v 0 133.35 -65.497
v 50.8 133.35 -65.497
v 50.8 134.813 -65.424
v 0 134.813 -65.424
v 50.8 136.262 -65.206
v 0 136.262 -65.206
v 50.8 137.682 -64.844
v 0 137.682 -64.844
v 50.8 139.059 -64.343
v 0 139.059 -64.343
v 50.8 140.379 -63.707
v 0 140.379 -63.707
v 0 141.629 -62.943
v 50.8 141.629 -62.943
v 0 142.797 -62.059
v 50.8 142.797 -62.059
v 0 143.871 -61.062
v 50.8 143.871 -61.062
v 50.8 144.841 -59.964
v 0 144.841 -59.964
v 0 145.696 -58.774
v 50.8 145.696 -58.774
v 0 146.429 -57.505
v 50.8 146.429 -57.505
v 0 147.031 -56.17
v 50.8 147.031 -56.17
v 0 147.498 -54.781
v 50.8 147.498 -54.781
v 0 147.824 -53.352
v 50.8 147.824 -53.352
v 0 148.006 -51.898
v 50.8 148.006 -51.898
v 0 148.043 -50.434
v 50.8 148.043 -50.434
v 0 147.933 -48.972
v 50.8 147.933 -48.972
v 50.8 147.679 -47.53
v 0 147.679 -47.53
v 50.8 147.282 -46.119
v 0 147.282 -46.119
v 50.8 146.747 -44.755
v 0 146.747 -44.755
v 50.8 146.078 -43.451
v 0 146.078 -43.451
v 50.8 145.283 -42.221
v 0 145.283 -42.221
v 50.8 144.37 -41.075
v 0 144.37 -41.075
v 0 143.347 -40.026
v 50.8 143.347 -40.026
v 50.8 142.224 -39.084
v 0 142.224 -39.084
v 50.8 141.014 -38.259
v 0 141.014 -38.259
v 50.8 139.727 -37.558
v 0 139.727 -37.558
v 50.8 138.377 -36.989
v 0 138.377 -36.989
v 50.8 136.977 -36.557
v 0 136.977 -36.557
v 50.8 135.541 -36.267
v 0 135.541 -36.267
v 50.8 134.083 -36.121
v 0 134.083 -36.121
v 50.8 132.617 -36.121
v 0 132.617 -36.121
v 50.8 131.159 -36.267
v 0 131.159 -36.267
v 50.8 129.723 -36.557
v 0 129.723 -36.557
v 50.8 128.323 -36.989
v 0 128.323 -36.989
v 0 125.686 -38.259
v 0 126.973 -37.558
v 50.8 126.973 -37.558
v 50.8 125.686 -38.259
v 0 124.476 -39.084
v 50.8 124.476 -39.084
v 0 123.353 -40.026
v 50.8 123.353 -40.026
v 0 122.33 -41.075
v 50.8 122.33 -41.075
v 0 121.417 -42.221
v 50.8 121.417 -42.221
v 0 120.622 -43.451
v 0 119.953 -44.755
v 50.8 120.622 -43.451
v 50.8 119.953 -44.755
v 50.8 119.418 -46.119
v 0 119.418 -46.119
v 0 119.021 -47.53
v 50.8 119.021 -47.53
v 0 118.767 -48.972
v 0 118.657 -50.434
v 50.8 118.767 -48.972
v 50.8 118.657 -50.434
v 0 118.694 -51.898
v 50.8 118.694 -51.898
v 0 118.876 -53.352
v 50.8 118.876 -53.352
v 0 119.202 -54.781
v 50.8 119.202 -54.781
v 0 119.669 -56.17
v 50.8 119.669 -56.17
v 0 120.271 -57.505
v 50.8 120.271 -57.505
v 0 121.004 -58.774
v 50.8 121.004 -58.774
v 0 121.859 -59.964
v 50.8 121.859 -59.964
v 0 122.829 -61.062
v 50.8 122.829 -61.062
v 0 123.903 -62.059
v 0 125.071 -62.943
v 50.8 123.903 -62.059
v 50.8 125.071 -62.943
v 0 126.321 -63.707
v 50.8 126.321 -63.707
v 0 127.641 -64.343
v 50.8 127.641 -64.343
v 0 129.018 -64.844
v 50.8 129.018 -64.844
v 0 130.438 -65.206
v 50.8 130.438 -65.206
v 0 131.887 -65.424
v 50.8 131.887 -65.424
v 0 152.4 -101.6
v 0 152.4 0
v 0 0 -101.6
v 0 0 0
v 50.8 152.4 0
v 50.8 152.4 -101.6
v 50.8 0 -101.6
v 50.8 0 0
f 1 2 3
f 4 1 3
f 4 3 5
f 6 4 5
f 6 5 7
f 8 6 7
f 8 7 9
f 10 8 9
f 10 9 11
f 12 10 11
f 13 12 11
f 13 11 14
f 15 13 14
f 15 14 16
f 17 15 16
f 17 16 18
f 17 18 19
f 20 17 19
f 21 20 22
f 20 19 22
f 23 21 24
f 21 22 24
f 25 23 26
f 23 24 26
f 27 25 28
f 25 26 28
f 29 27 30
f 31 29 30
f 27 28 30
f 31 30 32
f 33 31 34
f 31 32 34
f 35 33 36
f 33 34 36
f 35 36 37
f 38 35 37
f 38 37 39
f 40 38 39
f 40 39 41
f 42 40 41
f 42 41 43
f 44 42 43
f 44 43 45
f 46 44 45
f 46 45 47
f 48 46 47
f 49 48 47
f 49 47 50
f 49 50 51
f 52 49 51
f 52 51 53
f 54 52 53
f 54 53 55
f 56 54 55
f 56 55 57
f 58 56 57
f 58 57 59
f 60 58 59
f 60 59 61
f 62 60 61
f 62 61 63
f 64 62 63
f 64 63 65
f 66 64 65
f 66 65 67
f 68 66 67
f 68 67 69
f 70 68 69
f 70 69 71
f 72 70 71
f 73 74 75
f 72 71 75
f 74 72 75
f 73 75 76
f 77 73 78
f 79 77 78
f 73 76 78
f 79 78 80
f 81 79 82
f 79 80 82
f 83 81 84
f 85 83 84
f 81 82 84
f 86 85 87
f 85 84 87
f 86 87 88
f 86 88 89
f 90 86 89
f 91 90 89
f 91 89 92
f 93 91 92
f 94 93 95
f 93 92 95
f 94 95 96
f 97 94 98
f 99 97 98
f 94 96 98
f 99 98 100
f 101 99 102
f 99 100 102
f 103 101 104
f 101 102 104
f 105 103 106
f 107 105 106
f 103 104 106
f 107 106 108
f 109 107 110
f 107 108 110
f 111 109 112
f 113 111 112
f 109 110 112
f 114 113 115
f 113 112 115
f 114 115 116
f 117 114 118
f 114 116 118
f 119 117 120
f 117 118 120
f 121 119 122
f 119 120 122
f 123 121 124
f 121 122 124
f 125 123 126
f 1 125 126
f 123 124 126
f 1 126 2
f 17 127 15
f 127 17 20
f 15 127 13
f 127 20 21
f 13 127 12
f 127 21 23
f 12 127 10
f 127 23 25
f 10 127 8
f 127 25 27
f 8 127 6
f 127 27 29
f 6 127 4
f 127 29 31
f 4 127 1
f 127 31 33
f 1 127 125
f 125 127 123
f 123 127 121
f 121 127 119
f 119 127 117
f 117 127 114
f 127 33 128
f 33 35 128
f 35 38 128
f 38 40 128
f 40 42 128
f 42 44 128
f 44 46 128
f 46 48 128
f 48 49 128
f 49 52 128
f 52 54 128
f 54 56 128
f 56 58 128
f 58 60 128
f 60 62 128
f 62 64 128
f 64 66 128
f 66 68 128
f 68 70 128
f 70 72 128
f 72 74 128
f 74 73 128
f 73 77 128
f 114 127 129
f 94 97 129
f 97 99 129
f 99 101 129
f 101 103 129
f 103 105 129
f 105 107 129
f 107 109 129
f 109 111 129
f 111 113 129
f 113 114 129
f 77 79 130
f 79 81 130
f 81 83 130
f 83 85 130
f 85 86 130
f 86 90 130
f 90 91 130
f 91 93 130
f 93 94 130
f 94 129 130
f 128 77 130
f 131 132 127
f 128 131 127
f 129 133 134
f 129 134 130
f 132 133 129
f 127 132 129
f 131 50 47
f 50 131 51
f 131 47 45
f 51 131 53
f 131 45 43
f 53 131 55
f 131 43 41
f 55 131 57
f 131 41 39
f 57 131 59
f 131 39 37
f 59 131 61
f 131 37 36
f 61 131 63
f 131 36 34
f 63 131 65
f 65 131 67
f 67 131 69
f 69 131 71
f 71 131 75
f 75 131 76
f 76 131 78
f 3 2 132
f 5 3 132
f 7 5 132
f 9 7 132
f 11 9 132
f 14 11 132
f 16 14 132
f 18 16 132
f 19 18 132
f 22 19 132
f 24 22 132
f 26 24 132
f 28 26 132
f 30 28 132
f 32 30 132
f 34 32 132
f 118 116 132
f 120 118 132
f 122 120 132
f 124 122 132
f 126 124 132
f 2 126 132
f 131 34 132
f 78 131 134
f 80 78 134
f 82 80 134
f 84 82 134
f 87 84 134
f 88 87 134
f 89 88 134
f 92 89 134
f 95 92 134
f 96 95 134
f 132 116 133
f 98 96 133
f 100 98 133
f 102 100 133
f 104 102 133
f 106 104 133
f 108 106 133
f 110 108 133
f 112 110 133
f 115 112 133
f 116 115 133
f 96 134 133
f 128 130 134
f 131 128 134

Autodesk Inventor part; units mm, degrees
ref_plane "YZ Plane" through (0, 0, 0) normal (1, 0, 0) x (0, 1, 0)
ref_plane "XZ Plane" through (0, 0, 0) normal (0, 1, 0) x (-1, 0, 0)
ref_plane "XY Plane" through (0, 0, 0) normal (0, 0, 1) x (1, 0, 0)
sketch "Sketch1" plane through (0, 0, 0) normal (0, 1, 0) x (-1, 0, 0)
  line L0 (0, 0) -> (-50.8, 0)
  line L1 (-50.8, 0) -> (-50.8, -101.6)
  line L2 (-50.8, -101.6) -> (0, -101.6)
  line L3 (0, -101.6) -> (0, 0)
  dimension "d0" = 50.8
  dimension "d1" = 101.6
extrude "Extrusion1" add sketch "Sketch1" along normal blind 152.4
sketch "Sketch2" plane through (50.8, 0, 0) normal (1, 0, 0) x (0, 0, -1)
  circle A0 centre (50.8, 133.35) radius 14.6973
  line L0 (101.6, 0) -> (101.6, 152.4) projected
  line L1 (0, 152.4) -> (101.6, 152.4) projected
  point P0 (0, 0)
  dimension "d4" = 50.8
  dimension "d5" = 19.05
extrude "Extrusion2" cut sketch "Sketch2" against normal up to next
properties part number "lifterBrace"
